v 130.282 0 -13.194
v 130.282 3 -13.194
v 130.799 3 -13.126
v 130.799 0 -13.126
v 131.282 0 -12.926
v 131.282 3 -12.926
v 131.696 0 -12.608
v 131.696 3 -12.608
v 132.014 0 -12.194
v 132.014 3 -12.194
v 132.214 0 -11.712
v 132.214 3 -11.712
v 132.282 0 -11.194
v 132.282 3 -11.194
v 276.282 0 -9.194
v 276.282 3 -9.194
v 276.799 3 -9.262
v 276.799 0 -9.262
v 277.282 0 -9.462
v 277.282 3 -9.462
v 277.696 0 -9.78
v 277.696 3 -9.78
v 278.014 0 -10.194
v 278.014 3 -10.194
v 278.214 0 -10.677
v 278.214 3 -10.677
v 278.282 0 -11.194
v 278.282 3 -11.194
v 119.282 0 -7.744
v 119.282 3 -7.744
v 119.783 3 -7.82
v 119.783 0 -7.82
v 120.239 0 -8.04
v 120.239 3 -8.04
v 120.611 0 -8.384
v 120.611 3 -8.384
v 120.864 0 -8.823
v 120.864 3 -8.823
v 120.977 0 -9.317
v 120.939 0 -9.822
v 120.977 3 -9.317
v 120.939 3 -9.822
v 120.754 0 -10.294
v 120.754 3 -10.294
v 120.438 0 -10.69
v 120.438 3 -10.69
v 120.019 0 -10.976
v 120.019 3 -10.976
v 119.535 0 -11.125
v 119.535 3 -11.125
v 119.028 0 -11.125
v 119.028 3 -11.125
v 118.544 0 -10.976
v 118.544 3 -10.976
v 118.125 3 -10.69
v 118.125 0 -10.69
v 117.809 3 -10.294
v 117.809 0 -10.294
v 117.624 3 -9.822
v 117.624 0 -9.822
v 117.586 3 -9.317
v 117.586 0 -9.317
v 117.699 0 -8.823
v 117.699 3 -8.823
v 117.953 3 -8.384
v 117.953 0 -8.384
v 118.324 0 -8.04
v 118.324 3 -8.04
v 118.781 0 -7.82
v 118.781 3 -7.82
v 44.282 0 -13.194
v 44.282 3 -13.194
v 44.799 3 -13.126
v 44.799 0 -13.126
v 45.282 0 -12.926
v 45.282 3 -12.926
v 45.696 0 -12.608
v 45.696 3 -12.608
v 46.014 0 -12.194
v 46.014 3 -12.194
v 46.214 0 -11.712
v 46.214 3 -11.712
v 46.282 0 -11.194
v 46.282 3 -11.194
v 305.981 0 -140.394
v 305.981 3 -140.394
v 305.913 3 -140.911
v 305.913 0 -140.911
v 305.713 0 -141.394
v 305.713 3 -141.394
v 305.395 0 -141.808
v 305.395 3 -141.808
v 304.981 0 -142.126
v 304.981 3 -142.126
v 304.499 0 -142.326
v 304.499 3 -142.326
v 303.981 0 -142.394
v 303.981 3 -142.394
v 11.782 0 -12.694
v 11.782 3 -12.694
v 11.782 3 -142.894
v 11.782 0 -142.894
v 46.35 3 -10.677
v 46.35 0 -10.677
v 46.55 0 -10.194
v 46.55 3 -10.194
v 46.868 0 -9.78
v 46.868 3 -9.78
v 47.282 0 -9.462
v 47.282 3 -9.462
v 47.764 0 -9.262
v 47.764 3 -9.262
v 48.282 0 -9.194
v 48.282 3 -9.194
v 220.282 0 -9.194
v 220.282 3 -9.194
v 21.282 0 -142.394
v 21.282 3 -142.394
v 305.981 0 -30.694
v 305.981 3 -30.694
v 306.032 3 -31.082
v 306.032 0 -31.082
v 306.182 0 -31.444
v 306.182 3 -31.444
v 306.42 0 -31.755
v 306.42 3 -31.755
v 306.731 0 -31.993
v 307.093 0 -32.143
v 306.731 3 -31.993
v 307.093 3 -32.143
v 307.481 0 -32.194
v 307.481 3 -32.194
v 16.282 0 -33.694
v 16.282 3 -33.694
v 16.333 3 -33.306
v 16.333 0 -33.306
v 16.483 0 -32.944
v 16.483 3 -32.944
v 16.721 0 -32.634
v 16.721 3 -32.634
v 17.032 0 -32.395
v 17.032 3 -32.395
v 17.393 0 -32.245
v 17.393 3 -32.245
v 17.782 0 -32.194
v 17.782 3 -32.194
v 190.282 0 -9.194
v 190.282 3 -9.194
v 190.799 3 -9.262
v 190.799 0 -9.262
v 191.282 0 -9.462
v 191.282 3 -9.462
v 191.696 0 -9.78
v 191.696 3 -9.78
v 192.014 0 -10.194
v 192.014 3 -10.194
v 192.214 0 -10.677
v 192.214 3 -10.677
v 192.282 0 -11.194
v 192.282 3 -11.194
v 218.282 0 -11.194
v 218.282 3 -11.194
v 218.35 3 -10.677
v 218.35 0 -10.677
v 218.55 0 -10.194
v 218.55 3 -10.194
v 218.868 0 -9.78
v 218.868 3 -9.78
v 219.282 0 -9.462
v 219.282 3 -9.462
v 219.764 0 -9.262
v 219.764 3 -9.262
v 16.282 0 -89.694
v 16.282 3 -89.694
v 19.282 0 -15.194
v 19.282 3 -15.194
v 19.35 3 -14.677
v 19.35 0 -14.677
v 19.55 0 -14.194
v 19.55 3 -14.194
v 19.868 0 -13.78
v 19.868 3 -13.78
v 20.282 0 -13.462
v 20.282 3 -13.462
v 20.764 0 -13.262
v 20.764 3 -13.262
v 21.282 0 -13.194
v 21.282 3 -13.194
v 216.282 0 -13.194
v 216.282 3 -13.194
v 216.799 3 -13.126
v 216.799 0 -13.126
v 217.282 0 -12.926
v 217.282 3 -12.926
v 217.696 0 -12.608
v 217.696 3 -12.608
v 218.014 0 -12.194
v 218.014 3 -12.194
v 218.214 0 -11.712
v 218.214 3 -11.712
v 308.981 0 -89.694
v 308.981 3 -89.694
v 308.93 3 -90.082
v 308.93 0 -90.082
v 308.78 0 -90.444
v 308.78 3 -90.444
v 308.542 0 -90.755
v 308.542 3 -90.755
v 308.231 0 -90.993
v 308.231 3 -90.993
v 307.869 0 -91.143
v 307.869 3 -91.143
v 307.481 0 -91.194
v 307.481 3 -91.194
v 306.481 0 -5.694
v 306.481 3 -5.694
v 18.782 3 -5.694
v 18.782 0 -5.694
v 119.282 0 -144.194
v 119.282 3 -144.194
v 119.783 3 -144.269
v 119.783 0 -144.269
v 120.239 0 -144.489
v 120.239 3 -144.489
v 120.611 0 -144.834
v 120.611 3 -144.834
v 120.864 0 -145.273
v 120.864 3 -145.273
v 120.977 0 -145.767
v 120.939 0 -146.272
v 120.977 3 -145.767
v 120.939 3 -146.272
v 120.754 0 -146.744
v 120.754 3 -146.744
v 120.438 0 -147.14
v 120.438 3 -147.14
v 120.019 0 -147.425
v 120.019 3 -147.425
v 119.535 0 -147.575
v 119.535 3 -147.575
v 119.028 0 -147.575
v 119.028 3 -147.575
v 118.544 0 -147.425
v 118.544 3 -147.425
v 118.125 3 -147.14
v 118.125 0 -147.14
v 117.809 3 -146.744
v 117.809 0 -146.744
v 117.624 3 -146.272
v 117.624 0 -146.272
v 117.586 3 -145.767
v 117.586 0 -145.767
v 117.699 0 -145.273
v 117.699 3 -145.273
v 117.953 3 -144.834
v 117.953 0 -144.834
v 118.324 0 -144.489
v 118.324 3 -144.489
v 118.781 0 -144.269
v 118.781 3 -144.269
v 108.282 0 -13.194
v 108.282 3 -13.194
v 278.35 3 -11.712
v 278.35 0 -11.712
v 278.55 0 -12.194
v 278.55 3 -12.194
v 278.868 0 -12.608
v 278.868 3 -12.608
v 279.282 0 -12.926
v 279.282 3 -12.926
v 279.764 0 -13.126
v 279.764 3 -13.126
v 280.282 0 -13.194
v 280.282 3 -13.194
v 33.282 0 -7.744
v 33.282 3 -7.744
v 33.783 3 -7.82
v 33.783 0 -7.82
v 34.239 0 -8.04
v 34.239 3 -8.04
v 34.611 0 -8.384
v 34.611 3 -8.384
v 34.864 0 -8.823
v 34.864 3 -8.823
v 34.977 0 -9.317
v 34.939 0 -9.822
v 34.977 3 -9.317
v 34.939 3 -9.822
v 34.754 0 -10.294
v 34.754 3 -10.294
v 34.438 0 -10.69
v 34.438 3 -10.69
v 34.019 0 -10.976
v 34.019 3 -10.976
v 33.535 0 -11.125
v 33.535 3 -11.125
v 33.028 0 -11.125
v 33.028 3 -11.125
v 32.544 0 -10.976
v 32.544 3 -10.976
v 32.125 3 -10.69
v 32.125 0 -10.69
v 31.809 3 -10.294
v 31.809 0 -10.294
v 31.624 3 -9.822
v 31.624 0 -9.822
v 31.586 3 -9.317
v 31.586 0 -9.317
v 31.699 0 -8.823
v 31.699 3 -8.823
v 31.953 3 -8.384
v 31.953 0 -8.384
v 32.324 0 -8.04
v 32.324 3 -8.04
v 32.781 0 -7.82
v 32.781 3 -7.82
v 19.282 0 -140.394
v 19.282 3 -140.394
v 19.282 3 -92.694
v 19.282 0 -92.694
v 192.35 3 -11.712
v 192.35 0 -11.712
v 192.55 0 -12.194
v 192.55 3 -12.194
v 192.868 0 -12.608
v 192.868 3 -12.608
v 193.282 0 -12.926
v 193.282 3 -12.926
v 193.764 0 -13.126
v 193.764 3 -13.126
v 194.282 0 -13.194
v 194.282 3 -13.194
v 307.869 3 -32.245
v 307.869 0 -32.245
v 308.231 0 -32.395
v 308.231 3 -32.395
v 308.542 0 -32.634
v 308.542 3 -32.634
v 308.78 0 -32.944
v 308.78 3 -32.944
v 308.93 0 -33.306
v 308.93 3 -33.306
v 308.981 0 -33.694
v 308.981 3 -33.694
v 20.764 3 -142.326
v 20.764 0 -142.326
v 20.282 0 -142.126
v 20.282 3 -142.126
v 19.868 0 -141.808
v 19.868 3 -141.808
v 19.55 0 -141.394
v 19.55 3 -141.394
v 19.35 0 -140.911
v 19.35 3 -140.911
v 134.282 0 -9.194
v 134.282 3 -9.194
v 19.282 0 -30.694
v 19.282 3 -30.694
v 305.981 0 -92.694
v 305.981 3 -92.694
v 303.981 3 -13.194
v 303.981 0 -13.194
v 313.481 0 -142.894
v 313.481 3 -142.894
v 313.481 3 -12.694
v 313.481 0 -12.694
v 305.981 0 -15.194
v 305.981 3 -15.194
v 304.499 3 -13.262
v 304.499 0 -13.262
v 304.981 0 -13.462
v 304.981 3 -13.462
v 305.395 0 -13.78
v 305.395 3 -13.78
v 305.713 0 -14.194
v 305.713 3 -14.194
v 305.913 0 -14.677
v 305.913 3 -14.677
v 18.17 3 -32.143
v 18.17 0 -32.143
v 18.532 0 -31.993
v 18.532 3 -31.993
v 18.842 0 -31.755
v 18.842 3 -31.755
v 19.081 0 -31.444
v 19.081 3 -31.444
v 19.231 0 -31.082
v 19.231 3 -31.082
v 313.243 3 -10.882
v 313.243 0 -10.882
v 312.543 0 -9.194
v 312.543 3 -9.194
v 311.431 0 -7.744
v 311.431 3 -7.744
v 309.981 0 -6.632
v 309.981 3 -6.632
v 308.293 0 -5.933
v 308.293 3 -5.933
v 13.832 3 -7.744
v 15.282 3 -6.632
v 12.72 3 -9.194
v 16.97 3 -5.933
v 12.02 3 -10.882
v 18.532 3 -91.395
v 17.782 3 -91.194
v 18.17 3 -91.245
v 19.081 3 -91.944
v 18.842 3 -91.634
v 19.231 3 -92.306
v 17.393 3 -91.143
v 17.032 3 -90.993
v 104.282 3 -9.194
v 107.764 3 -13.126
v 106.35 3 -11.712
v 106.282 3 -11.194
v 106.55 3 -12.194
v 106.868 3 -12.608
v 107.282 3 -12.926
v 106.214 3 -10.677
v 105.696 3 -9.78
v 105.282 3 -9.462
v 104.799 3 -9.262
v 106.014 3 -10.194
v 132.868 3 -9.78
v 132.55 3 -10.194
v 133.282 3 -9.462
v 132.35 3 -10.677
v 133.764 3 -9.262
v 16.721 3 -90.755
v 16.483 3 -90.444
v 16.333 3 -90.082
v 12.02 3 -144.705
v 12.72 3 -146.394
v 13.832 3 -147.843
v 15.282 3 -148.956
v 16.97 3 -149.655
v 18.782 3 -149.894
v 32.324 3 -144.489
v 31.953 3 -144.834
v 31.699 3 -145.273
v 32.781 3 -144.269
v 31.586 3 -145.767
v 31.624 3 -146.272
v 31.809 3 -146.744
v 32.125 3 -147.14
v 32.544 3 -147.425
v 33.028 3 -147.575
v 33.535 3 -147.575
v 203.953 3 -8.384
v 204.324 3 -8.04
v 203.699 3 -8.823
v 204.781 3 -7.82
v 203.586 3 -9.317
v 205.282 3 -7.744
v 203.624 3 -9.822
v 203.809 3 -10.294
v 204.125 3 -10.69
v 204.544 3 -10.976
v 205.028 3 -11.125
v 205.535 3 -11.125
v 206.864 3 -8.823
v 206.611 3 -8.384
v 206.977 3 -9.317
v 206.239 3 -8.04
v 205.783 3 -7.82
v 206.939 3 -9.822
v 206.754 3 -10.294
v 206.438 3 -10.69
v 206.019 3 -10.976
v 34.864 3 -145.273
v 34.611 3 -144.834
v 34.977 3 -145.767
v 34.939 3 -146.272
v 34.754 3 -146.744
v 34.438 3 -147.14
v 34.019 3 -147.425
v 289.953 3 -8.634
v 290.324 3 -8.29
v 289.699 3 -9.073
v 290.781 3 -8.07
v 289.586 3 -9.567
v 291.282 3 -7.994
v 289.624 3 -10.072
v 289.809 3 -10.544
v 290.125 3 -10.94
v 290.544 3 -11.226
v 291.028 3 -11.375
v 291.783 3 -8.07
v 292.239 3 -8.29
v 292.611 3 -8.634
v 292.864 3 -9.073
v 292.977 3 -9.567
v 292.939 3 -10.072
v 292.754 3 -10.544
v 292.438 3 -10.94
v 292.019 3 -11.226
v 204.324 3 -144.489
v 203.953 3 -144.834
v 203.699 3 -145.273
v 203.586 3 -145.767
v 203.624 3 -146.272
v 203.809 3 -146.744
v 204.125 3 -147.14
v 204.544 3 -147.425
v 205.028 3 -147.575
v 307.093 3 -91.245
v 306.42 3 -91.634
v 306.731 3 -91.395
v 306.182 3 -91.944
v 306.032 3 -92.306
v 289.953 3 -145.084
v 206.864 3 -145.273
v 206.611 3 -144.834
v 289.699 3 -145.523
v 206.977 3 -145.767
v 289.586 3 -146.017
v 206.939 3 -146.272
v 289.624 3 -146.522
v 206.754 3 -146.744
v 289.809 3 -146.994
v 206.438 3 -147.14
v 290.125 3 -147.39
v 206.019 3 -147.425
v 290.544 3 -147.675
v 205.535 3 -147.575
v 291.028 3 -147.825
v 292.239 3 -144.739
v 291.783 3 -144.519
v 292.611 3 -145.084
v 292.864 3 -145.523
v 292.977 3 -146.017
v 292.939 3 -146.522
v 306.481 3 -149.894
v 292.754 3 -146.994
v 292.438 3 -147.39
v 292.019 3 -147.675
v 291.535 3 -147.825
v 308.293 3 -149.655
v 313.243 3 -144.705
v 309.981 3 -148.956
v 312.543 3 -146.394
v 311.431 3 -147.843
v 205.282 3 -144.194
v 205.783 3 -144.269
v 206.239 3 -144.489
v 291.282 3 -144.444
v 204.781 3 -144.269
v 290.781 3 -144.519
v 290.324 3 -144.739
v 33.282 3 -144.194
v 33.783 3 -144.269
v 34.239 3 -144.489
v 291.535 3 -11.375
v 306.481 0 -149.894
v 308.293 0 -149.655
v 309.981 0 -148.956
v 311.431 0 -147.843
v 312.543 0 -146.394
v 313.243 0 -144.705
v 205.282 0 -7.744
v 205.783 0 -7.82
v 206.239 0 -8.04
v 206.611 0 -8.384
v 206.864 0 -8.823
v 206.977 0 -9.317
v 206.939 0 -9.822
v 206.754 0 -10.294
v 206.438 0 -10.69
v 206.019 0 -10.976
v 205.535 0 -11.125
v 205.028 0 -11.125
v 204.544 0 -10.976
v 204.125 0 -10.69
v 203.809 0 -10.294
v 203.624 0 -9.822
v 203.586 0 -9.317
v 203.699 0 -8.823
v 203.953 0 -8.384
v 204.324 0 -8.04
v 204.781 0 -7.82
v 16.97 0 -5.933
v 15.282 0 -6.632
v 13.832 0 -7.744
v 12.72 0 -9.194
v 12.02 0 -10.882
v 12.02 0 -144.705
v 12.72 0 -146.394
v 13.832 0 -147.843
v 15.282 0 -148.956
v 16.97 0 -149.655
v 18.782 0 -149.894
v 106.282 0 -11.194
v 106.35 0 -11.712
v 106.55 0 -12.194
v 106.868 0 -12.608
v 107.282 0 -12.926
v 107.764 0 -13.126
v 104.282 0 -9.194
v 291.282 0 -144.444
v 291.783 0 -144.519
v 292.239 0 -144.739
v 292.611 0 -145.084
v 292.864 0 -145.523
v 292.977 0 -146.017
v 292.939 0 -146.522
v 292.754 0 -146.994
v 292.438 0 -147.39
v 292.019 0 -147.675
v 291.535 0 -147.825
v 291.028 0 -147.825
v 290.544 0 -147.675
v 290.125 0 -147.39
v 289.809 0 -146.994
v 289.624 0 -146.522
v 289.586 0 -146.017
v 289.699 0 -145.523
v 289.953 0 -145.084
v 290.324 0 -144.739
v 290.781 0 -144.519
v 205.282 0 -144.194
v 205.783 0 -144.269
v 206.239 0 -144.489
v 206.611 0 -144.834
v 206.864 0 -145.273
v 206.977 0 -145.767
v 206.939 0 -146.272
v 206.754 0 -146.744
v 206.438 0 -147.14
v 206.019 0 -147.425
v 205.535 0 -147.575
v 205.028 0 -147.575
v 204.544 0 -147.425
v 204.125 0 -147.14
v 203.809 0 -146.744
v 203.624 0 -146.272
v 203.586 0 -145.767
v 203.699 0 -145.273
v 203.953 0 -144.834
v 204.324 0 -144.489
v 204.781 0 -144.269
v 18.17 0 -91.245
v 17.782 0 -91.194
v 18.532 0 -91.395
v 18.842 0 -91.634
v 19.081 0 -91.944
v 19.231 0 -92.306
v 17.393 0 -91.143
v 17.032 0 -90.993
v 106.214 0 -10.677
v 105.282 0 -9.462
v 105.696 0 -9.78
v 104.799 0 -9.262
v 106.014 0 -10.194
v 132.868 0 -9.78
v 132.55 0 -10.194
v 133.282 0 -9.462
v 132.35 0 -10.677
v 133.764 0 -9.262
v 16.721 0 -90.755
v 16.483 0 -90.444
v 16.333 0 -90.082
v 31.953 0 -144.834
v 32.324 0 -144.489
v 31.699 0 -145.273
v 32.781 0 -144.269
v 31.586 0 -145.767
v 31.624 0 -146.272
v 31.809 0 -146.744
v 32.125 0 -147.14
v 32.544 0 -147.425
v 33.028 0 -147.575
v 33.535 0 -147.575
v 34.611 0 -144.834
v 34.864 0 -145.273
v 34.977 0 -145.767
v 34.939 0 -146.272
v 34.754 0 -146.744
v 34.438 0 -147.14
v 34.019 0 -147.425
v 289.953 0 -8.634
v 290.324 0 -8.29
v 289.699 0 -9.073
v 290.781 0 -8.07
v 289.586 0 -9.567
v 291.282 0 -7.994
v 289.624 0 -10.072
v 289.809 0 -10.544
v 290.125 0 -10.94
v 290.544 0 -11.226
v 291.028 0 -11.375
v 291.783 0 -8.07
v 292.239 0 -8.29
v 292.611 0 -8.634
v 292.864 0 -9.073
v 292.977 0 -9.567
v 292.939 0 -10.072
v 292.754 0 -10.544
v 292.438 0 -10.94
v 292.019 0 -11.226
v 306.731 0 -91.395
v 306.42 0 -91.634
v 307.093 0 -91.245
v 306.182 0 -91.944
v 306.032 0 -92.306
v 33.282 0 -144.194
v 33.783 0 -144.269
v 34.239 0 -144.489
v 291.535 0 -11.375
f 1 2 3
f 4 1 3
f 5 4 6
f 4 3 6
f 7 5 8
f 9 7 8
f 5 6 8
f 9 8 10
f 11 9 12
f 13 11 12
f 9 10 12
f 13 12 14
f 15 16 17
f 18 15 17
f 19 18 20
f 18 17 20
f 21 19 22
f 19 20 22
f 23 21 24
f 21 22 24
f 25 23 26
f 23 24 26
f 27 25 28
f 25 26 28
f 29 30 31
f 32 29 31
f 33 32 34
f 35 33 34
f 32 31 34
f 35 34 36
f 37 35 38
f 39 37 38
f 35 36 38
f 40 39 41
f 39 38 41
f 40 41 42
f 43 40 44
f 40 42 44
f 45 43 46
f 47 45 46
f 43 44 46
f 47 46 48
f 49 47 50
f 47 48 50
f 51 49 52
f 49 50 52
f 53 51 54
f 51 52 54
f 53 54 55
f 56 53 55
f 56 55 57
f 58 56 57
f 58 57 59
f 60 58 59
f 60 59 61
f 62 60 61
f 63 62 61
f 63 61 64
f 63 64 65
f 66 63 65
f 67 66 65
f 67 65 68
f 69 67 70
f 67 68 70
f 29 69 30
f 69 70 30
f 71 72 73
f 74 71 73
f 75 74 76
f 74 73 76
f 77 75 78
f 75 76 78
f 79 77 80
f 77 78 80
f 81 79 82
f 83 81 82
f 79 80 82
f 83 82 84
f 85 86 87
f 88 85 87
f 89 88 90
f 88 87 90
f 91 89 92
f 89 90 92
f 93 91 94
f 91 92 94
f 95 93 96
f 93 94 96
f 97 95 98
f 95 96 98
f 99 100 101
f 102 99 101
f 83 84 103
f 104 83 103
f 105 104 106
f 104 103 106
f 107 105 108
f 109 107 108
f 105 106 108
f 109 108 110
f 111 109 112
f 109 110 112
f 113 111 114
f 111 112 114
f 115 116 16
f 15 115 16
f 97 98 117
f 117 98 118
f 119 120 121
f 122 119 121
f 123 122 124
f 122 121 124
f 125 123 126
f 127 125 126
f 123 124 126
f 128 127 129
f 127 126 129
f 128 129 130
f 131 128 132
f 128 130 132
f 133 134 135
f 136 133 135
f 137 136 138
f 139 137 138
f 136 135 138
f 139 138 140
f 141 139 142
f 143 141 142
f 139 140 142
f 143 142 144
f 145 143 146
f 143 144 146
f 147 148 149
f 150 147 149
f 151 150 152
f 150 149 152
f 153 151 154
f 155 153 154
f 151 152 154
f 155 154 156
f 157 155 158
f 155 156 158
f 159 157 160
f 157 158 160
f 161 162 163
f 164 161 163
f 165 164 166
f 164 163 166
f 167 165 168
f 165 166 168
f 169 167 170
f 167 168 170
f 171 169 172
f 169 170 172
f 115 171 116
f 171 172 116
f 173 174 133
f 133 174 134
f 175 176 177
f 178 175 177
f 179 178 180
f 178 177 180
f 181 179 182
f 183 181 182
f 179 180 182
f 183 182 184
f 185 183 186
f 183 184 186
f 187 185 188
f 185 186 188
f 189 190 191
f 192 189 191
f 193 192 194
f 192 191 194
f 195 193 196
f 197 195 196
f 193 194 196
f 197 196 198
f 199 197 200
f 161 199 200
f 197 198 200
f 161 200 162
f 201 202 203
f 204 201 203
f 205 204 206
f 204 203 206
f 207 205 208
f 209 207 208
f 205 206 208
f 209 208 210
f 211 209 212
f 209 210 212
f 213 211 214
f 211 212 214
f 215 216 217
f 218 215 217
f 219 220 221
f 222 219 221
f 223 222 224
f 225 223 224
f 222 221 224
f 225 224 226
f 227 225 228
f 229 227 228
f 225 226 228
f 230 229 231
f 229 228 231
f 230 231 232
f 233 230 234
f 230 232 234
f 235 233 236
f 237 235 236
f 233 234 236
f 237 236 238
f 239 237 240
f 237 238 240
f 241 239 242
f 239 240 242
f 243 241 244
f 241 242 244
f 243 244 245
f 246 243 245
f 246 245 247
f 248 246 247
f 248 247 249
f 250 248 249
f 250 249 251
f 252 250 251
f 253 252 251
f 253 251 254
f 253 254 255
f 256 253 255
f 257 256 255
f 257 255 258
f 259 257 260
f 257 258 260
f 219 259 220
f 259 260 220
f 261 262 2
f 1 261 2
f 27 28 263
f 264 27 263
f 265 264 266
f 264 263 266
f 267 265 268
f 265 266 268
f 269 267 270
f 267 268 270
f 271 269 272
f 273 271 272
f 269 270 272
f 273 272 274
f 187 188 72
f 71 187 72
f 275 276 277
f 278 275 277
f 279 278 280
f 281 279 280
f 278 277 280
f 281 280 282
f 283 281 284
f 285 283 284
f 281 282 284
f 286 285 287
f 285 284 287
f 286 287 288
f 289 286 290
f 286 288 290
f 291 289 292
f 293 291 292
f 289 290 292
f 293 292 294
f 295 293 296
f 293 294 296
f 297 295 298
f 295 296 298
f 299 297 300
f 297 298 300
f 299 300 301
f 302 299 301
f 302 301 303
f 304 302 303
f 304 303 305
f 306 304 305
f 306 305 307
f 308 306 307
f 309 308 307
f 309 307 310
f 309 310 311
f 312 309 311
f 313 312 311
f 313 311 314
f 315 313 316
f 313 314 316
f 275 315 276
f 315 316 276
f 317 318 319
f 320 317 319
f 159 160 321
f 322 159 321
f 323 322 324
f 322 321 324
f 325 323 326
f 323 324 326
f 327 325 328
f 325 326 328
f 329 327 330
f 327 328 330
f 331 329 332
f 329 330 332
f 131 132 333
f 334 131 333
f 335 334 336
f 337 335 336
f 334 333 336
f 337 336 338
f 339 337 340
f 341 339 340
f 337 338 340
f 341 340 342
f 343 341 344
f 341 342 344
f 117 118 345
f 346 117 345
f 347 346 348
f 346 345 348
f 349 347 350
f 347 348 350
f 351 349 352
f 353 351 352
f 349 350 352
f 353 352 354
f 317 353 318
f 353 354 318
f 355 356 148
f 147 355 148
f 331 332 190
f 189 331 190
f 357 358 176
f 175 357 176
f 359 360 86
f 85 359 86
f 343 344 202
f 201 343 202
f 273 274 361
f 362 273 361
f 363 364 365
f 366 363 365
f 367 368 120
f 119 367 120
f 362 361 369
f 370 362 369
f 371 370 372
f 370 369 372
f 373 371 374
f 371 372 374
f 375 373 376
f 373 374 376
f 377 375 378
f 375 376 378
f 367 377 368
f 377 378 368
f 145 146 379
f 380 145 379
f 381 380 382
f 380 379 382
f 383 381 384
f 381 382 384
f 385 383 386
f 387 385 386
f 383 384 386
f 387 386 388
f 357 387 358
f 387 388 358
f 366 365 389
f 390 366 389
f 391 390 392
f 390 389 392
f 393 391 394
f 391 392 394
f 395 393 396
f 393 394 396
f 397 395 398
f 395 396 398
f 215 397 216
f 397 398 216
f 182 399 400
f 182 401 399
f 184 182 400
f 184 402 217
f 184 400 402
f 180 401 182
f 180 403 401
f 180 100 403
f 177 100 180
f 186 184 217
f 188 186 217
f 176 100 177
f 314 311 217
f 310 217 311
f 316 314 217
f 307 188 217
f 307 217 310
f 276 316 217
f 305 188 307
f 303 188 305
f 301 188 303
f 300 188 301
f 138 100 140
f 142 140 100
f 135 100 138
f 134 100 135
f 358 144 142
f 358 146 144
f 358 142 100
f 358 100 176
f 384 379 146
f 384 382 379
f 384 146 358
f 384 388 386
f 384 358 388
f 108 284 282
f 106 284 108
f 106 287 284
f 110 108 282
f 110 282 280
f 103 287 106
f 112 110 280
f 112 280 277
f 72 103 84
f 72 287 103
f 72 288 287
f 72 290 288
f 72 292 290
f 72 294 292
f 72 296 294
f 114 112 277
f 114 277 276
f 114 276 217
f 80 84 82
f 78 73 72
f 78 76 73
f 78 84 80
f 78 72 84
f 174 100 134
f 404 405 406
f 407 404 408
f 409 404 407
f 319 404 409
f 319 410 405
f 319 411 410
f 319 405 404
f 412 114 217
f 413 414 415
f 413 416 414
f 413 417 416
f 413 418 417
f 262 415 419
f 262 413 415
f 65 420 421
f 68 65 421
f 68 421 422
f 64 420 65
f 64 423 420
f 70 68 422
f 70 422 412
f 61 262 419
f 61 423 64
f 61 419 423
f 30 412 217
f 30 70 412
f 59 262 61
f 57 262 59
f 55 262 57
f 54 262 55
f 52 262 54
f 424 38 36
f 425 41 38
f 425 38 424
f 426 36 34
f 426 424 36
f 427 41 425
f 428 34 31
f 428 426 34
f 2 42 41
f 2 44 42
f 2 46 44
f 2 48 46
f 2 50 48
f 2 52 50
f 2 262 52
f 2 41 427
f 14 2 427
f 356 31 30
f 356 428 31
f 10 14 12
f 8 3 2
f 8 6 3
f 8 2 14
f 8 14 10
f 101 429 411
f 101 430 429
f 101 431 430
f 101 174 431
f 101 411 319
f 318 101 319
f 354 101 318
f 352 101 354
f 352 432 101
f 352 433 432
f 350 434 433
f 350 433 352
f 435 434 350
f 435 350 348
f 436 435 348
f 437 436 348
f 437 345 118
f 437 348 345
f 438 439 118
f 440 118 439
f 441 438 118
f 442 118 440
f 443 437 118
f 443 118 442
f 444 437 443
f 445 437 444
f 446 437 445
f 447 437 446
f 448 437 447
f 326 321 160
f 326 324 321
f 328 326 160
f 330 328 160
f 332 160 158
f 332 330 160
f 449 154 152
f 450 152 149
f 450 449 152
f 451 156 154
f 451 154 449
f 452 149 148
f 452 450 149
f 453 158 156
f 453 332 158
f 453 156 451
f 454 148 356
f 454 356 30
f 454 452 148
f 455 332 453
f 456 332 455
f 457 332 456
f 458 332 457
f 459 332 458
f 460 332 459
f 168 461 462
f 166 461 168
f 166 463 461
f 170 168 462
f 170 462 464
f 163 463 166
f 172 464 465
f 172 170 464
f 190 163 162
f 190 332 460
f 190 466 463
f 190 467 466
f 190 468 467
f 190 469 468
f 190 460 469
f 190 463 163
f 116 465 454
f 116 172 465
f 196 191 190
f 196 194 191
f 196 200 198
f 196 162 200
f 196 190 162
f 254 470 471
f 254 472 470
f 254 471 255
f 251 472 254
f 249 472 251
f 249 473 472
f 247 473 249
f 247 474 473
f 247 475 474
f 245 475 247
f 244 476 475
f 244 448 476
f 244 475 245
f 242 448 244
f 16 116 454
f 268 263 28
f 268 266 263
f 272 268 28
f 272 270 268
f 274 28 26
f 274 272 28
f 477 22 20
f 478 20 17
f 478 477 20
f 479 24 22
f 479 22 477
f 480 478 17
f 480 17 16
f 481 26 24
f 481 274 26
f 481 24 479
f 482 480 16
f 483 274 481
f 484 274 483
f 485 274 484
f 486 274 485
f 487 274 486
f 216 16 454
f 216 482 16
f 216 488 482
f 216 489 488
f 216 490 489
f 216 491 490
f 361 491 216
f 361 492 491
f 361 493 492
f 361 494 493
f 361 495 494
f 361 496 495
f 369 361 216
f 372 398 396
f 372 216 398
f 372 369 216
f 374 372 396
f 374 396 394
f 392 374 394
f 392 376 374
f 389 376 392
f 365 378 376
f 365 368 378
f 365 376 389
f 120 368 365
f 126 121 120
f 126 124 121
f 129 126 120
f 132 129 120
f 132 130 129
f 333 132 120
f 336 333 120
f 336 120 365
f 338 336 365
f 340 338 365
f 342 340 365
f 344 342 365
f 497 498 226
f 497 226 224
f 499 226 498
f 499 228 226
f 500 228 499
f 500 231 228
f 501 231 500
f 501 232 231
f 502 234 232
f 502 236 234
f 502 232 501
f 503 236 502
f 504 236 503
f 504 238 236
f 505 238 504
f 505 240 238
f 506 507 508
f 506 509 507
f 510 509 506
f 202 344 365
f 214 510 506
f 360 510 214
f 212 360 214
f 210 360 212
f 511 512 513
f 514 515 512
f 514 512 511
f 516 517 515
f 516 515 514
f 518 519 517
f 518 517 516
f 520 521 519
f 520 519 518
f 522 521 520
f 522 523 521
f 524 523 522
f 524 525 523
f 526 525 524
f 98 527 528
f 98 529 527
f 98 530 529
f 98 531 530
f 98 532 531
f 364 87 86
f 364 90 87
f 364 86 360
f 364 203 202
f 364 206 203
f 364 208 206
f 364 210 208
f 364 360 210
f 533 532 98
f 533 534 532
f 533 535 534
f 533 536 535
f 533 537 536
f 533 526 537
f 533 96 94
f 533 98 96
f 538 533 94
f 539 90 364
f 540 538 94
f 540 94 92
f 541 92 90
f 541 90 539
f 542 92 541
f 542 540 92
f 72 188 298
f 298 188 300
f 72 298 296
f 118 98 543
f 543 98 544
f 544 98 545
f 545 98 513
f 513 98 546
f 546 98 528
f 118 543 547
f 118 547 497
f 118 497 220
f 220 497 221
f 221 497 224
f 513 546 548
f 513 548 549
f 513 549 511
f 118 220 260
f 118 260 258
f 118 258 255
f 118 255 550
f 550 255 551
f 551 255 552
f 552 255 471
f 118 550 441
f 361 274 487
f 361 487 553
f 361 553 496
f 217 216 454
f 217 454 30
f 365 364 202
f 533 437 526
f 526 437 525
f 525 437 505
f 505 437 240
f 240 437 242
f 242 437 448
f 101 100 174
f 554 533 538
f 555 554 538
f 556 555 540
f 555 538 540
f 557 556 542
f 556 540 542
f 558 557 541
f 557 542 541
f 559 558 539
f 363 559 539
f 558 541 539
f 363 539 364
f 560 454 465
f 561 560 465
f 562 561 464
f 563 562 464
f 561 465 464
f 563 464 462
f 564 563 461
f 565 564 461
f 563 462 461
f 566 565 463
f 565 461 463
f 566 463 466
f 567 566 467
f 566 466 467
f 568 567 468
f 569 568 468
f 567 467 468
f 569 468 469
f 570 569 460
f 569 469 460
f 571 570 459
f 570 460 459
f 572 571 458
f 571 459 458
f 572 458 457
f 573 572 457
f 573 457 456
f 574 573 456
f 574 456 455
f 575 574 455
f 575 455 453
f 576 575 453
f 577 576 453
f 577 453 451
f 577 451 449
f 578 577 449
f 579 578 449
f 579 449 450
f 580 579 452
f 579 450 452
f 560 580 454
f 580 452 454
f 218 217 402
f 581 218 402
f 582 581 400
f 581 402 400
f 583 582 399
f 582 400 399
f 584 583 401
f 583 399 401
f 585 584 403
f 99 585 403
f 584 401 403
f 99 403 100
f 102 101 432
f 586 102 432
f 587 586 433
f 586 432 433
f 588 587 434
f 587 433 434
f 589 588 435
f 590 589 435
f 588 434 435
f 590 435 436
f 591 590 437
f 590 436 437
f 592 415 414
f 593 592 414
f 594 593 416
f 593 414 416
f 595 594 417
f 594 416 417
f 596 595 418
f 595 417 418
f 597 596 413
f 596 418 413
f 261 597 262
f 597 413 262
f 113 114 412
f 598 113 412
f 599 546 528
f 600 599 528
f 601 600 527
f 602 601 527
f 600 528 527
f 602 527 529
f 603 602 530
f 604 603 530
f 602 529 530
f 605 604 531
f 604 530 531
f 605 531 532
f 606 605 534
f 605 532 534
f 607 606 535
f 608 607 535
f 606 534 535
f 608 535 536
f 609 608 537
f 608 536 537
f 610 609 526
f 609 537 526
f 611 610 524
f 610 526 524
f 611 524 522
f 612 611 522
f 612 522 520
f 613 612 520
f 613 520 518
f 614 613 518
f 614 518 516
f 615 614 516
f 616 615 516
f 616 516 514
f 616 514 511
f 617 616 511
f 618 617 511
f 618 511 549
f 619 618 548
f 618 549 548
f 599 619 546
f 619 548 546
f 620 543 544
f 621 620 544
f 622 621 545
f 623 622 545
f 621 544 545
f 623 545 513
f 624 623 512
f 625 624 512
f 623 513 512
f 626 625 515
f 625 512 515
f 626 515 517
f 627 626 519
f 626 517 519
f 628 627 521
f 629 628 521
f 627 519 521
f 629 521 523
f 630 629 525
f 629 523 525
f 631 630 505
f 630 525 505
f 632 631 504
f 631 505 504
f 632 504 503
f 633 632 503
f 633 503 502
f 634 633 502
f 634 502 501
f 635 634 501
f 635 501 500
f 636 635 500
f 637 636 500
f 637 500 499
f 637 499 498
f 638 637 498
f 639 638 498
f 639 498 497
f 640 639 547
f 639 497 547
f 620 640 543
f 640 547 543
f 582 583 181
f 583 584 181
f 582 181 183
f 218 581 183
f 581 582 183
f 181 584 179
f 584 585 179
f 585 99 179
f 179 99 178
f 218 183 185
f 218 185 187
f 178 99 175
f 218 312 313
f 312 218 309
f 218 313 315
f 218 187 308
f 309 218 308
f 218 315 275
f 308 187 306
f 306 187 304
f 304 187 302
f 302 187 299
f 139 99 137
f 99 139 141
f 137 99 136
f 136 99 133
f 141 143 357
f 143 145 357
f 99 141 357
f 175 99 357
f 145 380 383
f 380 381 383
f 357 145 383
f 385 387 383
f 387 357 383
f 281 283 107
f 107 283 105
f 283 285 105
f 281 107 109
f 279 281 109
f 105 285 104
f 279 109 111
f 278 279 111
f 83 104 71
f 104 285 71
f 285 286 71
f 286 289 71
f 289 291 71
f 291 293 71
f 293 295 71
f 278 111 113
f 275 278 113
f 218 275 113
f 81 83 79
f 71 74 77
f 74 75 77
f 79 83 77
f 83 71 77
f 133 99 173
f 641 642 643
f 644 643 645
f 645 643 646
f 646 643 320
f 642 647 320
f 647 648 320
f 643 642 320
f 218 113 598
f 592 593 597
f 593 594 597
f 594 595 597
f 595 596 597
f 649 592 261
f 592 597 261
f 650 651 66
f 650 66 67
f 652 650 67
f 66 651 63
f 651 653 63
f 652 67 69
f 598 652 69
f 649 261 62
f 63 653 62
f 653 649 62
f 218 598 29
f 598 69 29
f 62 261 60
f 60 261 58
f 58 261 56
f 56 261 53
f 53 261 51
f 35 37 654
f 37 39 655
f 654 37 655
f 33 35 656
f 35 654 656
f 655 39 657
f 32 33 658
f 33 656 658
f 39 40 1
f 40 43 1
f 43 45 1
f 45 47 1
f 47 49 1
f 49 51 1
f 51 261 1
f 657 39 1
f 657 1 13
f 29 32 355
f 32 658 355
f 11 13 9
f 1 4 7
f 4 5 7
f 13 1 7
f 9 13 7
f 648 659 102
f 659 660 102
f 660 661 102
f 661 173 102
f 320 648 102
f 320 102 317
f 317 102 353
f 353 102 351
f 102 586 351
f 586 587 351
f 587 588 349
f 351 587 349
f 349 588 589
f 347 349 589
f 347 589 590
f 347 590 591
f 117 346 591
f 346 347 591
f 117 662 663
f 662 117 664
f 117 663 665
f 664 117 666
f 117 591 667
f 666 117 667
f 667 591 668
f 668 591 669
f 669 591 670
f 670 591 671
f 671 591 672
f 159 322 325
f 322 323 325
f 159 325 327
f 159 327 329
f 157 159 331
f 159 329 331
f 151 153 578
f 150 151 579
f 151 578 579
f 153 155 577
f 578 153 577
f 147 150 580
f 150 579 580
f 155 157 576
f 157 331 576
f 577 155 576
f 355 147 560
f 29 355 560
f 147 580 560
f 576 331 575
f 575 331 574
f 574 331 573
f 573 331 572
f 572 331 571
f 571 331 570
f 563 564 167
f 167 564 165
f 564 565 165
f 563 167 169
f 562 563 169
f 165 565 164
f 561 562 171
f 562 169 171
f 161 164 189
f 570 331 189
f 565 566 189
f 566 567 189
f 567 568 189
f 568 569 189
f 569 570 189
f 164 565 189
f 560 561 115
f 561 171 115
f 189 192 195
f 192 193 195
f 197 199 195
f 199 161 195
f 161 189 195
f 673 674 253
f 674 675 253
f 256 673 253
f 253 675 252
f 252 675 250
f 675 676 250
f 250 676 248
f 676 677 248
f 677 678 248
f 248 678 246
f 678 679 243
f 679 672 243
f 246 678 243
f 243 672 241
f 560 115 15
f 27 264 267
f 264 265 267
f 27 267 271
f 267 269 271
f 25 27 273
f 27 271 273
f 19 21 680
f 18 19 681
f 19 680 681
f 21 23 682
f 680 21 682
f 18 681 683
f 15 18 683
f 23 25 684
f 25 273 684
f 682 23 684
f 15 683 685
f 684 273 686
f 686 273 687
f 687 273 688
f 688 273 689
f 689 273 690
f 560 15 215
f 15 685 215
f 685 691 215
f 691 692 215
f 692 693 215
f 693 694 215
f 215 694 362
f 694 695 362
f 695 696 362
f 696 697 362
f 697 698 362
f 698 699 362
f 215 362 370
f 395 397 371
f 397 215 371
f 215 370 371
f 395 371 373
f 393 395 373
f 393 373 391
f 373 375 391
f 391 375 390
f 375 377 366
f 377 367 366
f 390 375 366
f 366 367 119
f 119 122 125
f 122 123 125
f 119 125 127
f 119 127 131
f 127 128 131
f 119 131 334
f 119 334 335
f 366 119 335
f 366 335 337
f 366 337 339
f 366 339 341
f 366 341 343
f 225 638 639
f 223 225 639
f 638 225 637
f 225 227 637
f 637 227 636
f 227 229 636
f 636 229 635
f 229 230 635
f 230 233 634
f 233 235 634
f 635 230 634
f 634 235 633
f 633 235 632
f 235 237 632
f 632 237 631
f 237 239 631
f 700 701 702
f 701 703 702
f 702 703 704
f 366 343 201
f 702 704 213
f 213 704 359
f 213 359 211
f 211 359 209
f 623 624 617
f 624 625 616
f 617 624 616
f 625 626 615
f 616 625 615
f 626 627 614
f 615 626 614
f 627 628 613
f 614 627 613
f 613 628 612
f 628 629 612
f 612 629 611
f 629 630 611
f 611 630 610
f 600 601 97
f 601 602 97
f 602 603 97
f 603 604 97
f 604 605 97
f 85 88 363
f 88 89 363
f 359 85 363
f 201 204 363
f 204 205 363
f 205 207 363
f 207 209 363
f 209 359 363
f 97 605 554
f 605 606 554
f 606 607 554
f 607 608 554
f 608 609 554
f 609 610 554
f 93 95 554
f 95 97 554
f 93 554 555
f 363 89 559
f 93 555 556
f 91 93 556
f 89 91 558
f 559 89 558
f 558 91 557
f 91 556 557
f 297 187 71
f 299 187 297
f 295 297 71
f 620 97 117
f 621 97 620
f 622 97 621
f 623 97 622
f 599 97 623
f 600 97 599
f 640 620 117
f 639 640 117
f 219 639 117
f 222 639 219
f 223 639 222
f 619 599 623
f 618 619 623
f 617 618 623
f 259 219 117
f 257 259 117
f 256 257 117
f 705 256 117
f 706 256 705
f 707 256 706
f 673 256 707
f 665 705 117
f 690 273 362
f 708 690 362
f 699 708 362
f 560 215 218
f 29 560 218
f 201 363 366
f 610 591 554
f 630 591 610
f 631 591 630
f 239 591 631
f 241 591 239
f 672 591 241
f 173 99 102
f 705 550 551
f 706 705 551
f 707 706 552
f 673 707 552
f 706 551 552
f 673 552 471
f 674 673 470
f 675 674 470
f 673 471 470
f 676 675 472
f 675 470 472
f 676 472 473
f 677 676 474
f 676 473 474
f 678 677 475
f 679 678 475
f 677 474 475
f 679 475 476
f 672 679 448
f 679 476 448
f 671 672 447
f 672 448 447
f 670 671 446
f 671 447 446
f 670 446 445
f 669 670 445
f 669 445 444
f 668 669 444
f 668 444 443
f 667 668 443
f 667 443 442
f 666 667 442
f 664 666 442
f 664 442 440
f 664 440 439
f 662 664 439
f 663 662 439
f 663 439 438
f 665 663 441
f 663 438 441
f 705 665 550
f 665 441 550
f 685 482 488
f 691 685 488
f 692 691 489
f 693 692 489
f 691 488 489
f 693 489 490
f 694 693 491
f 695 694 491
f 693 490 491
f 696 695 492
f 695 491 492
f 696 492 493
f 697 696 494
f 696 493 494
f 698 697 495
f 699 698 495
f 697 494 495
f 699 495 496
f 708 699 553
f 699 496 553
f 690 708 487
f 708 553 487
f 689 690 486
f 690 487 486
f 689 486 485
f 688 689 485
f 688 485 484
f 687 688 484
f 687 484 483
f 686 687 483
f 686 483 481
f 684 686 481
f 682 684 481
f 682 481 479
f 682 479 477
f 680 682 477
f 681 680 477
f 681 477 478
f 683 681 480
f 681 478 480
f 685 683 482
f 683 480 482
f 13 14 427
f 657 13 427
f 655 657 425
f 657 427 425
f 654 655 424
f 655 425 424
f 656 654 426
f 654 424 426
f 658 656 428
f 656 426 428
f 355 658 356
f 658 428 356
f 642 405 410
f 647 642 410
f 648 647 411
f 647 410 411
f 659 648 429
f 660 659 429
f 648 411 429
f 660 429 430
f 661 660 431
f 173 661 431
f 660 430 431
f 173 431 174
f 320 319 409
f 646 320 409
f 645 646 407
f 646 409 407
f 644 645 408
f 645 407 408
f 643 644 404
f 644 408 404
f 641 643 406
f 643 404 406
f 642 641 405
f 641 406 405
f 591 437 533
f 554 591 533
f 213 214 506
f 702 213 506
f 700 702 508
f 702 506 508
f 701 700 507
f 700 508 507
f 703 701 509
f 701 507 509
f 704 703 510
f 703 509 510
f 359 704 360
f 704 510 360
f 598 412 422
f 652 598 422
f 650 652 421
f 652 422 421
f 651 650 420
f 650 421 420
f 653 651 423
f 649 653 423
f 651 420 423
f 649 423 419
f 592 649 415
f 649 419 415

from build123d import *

# Parameters (mm, degrees)
SKETCH1_W           = 350
SKETCH1_H           = 200
BOSS_EXTRUDE1_DEPTH = 3
SKETCH2_W           = 350
SKETCH2_H           = 200
SKETCH2_R           = 1.7
CUT_EXTRUDE2_DEPTH  = 3


with BuildPart() as part:
    # Sketch1 → Boss-Extrude1 (new body)
    with BuildSketch(Plane(origin=(0, 0, 0), x_dir=(1, 0, 0), z_dir=(0, 1, 0))):
        with Locations((175, 100)):
            Rectangle(SKETCH1_W, SKETCH1_H)
    extrude(amount=BOSS_EXTRUDE1_DEPTH)

    # Sketch2 → Cut-Extrude2 (cut)
    with BuildSketch(Plane(origin=(0, 3, 0), x_dir=(1, 0, 0), z_dir=(0, 1, 0))):
        with Locations((175, 100)):
            Rectangle(SKETCH2_W, SKETCH2_H)
        with BuildLine():
            ThreePointArc((18.78172506, 5.694207131), (13.831977592, 7.744459663), (11.78172506, 12.694207131))
            Line((11.78172506, 12.694207131), (11.78172506, 142.893667131))
            ThreePointArc((11.78172506, 142.893667131), (13.831977592, 147.843414599), (18.78172506, 149.893667131))
            Line((18.78172506, 149.893667131), (306.48107506, 149.893667131))
            ThreePointArc((306.48107506, 149.893667131), (311.430822528, 147.843414599), (313.48107506, 142.893667131))
            Line((313.48107506, 142.893667131), (313.48107506, 12.694207131))
            ThreePointArc((313.48107506, 12.694207131), (311.430822528, 7.744459663), (306.48107506, 5.694207131))
            Line((306.48107506, 5.694207131), (18.78172506, 5.694207131))
        make_face(mode=Mode.SUBTRACT)
        with Locations(Location((119.28172506, 145.893667131, 0), (0, 0, 270))):
            Circle(SKETCH2_R)
        with Locations(Location((33.28172506, 145.893667131, 0), (0, 0, 270))):
            Circle(SKETCH2_R)
        with Locations(Location((205.28172506, 145.893667131, 0), (0, 0, 270))):
            Circle(SKETCH2_R)
        with Locations(Location((291.28172506, 146.143667131, 0), (0, 0, 270))):
            Circle(SKETCH2_R)
        with Locations(Location((119.28172506, 9.444207131, 0), (0, 0, 270))):
            Circle(SKETCH2_R)
        with Locations(Location((33.28172506, 9.444207131, 0), (0, 0, 270))):
            Circle(SKETCH2_R)
        with Locations(Location((205.28172506, 9.444207131, 0), (0, 0, 270))):
            Circle(SKETCH2_R)
        with Locations(Location((291.28172506, 9.694207131, 0), (0, 0, 270))):
            Circle(SKETCH2_R)
        with BuildLine():
            ThreePointArc((46.28172506, 11.194207131), (46.867511498, 9.779993569), (48.28172506, 9.194207131))
            Line((48.28172506, 9.194207131), (104.28172506, 9.194207131))
            ThreePointArc((104.28172506, 9.194207131), (105.695938623, 9.779993569), (106.28172506, 11.194207131))
            ThreePointArc((106.28172506, 11.194207131), (106.867511498, 12.608420694), (108.28172506, 13.194207131))
            Line((108.28172506, 13.194207131), (130.28172506, 13.194207131))
            ThreePointArc((130.28172506, 13.194207131), (131.695938623, 12.608420694), (132.28172506, 11.194207131))
            ThreePointArc((132.28172506, 11.194207131), (132.867511498, 9.779993569), (134.28172506, 9.194207131))
            Line((134.28172506, 9.194207131), (190.28172506, 9.194207131))
            ThreePointArc((190.28172506, 9.194207131), (191.695938623, 9.779993569), (192.28172506, 11.194207131))
            ThreePointArc((192.28172506, 11.194207131), (192.867511498, 12.608420694), (194.28172506, 13.194207131))
            Line((194.28172506, 13.194207131), (216.28172506, 13.194207131))
            ThreePointArc((216.28172506, 13.194207131), (217.695938623, 12.608420694), (218.28172506, 11.194207131))
            ThreePointArc((218.28172506, 11.194207131), (218.867511498, 9.779993569), (220.28172506, 9.194207131))
            Line((220.28172506, 9.194207131), (276.28172506, 9.194207131))
            ThreePointArc((276.28172506, 9.194207131), (277.695938623, 9.779993569), (278.28172506, 11.194207131))
            ThreePointArc((278.28172506, 11.194207131), (278.867511498, 12.608420694), (280.28172506, 13.194207131))
            Line((280.28172506, 13.194207131), (303.98107506, 13.194207131))
            ThreePointArc((303.98107506, 13.194207131), (305.395288623, 13.779993569), (305.98107506, 15.194207131))
            Line((305.98107506, 15.194207131), (305.98107506, 30.694207131))
            ThreePointArc((305.98107506, 30.694207131), (306.420414888, 31.754867303), (307.48107506, 32.194207131))
            ThreePointArc((307.48107506, 32.194207131), (308.541735232, 32.633546959), (308.98107506, 33.694207131))
            Line((308.98107506, 33.694207131), (308.98107506, 89.694207131))
            ThreePointArc((308.98107506, 89.694207131), (308.541735232, 90.754867303), (307.48107506, 91.194207131))
            ThreePointArc((307.48107506, 91.194207131), (306.420414888, 91.633546959), (305.98107506, 92.694207131))
            Line((305.98107506, 92.694207131), (305.98107506, 140.393667131))
            ThreePointArc((305.98107506, 140.393667131), (305.395288623, 141.807880694), (303.98107506, 142.393667131))
            Line((303.98107506, 142.393667131), (21.28172506, 142.393667131))
            ThreePointArc((21.28172506, 142.393667131), (19.867511498, 141.807880694), (19.28172506, 140.393667131))
            Line((19.28172506, 140.393667131), (19.28172506, 92.694207131))
            ThreePointArc((19.28172506, 92.694207131), (18.842385232, 91.633546959), (17.78172506, 91.194207131))
            ThreePointArc((17.78172506, 91.194207131), (16.721064888, 90.754867303), (16.28172506, 89.694207131))
            Line((16.28172506, 89.694207131), (16.28172506, 33.694207131))
            ThreePointArc((16.28172506, 33.694207131), (16.721064888, 32.633546959), (17.78172506, 32.194207131))
            ThreePointArc((17.78172506, 32.194207131), (18.842385232, 31.754867303), (19.28172506, 30.694207131))
            Line((19.28172506, 30.694207131), (19.28172506, 15.194207131))
            ThreePointArc((19.28172506, 15.194207131), (19.867511498, 13.779993569), (21.28172506, 13.194207131))
            Line((21.28172506, 13.194207131), (44.28172506, 13.194207131))
            ThreePointArc((44.28172506, 13.194207131), (45.695938623, 12.608420694), (46.28172506, 11.194207131))
        make_face()
    extrude(amount=-CUT_EXTRUDE2_DEPTH, mode=Mode.SUBTRACT)


solid = part.part
